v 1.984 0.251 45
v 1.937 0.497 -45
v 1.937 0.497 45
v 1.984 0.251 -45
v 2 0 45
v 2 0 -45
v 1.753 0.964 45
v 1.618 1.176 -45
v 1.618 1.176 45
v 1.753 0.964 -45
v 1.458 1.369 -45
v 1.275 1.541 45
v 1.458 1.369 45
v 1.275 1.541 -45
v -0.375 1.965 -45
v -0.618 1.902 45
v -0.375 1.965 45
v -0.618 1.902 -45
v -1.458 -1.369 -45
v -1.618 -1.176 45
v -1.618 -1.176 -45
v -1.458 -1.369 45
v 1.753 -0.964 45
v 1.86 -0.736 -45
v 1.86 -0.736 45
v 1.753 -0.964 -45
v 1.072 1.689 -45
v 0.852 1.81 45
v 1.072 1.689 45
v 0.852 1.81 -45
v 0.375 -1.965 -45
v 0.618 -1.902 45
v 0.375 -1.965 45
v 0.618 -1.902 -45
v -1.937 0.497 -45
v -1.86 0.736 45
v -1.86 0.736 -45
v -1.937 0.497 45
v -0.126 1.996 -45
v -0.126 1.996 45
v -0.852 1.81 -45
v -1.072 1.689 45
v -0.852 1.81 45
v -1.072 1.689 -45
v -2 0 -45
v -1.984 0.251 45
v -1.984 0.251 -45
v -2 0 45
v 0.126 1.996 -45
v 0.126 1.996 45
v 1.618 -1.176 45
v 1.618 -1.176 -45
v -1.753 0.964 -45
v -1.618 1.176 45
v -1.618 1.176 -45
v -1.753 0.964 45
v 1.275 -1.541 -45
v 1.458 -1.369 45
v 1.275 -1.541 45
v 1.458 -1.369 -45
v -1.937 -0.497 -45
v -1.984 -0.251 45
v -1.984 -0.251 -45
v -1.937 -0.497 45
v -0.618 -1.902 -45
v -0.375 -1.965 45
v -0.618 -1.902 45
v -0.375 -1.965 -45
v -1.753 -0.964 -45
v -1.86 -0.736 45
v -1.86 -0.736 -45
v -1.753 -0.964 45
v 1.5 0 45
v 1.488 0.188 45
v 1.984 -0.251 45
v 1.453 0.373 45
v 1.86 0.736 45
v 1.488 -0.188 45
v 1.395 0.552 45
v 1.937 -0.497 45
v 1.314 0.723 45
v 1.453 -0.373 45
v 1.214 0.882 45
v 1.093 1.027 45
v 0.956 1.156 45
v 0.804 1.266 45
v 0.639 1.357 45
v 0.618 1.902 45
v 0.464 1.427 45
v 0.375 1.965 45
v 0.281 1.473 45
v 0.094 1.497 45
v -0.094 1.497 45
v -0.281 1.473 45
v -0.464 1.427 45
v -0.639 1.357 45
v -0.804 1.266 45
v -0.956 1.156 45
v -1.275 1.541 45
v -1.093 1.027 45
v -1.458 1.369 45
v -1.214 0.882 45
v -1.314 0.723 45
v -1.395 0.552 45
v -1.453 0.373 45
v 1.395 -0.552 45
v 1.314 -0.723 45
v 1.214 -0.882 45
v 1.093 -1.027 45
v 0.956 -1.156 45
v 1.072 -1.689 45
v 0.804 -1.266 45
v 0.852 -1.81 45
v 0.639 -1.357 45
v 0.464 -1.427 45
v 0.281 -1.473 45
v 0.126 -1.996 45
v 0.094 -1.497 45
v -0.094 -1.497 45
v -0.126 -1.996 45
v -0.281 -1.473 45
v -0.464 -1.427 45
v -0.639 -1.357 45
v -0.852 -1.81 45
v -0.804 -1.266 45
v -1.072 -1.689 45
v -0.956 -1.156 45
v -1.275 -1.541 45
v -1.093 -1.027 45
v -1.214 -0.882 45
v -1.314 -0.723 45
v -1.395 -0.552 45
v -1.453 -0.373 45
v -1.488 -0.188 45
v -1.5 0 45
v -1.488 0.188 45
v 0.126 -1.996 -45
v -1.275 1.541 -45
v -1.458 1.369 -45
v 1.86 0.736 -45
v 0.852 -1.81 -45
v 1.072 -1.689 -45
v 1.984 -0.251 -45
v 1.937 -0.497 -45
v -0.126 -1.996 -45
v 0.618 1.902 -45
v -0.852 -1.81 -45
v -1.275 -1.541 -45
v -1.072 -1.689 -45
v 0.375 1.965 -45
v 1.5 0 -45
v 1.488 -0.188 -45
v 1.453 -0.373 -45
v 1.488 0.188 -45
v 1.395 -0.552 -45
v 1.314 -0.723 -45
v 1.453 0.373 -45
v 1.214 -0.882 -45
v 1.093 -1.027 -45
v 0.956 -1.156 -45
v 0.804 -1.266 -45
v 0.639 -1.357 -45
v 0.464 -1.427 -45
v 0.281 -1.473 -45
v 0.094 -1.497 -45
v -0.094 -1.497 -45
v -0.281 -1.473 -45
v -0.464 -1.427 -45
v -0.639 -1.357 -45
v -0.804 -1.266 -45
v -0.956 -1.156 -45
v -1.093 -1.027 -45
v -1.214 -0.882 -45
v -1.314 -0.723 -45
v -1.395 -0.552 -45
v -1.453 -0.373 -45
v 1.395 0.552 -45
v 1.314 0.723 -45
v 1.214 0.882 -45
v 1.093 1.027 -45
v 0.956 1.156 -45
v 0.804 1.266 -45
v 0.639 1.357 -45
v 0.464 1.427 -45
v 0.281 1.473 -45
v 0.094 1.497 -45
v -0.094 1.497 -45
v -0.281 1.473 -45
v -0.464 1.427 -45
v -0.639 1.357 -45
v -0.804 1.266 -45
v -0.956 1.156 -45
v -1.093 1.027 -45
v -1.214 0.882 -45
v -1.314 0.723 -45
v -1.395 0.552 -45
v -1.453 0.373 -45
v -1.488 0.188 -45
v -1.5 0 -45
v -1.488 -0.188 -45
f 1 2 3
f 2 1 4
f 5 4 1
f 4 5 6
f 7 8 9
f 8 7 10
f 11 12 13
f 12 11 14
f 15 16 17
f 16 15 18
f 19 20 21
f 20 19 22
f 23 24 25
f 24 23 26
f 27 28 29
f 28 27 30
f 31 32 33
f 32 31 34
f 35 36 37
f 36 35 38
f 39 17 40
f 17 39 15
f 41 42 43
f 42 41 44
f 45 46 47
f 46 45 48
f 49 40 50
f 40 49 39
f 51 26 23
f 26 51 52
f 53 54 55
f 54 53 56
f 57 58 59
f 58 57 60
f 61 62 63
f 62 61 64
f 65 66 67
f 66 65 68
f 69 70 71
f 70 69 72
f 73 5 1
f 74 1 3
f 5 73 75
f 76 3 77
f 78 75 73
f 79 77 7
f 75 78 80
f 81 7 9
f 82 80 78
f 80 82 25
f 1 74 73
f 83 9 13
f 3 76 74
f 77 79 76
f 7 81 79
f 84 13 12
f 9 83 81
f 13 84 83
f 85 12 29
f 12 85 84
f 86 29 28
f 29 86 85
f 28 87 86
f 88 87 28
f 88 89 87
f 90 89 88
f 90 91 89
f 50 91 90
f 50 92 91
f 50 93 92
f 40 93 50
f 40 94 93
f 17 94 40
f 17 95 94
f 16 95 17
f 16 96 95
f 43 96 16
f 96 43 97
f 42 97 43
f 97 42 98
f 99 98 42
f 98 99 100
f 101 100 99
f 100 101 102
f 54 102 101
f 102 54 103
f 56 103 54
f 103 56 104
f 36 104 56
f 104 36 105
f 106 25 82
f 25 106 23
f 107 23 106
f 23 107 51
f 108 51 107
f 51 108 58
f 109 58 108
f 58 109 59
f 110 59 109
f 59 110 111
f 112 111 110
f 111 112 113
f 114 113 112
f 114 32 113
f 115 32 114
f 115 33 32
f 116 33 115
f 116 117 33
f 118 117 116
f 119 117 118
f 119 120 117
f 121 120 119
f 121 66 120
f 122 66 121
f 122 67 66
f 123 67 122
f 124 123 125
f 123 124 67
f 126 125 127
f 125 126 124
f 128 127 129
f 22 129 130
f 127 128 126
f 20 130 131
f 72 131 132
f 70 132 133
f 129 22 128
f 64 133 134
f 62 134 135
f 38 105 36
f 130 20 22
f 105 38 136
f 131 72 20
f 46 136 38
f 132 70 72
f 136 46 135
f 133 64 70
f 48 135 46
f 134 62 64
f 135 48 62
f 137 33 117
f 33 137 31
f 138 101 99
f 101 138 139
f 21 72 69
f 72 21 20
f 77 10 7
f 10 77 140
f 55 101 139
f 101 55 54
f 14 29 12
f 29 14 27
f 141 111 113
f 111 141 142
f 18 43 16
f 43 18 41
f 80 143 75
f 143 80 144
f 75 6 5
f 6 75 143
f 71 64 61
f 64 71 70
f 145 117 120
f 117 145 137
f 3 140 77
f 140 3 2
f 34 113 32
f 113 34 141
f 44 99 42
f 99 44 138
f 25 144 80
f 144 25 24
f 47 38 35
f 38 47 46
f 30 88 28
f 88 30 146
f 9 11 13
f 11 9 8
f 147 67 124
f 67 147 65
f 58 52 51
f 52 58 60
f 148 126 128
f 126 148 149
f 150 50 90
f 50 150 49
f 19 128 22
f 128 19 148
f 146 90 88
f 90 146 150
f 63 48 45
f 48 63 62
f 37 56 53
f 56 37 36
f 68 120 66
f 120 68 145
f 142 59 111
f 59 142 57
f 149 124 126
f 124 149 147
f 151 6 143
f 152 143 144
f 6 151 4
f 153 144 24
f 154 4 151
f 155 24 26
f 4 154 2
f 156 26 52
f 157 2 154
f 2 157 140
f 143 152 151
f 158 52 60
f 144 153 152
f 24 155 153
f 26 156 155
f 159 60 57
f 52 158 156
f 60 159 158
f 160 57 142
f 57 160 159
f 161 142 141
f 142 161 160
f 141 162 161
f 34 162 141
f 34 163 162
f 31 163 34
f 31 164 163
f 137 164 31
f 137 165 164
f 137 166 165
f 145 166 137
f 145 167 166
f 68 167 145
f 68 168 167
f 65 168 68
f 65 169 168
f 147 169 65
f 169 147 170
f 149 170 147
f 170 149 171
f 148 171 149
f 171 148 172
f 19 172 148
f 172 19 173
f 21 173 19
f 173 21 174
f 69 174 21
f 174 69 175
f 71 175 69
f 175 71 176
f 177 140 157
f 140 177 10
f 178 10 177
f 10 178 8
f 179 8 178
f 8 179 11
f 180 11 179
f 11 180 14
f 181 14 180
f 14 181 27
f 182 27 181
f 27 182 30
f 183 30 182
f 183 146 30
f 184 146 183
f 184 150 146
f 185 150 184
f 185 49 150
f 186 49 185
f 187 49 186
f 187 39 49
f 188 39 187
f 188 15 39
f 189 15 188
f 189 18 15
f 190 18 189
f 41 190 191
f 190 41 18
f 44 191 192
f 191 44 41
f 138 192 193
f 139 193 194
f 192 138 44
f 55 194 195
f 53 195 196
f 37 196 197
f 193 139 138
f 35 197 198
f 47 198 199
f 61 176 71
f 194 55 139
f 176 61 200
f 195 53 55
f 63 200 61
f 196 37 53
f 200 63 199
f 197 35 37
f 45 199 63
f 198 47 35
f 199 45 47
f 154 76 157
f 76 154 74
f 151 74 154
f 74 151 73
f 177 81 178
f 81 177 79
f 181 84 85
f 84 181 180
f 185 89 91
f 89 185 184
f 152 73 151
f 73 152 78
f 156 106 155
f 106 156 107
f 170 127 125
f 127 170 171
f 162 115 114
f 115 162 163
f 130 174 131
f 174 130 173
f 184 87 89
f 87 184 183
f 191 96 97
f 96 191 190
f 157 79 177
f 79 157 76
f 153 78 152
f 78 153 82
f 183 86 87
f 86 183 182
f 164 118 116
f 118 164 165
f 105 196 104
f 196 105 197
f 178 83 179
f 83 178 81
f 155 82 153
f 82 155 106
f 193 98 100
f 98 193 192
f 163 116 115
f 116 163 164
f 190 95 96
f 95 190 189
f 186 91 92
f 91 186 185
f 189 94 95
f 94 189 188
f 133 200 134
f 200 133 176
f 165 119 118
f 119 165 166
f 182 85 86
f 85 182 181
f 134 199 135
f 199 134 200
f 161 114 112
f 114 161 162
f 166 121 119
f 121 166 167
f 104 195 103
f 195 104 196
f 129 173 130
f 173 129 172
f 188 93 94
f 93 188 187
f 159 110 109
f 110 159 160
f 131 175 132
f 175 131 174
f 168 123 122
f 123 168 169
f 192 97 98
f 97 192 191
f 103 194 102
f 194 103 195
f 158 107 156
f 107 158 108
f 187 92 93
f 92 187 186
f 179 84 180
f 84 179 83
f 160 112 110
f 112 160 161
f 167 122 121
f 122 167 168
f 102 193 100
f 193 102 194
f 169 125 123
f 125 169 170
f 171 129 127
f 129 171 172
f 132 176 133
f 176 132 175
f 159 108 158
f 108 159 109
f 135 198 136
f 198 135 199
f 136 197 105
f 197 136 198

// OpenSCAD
$fn = 50;


difference() {
	union() {
		translate(v = [0, 0, -45.0000000000]) {
			cylinder(h = 90, r = 2.0000000000);
		}
	}
	union() {
		translate(v = [0, 0, -100.0000000000]) {
			cylinder(h = 200, r = 1.5000000000);
		}
	}
}
